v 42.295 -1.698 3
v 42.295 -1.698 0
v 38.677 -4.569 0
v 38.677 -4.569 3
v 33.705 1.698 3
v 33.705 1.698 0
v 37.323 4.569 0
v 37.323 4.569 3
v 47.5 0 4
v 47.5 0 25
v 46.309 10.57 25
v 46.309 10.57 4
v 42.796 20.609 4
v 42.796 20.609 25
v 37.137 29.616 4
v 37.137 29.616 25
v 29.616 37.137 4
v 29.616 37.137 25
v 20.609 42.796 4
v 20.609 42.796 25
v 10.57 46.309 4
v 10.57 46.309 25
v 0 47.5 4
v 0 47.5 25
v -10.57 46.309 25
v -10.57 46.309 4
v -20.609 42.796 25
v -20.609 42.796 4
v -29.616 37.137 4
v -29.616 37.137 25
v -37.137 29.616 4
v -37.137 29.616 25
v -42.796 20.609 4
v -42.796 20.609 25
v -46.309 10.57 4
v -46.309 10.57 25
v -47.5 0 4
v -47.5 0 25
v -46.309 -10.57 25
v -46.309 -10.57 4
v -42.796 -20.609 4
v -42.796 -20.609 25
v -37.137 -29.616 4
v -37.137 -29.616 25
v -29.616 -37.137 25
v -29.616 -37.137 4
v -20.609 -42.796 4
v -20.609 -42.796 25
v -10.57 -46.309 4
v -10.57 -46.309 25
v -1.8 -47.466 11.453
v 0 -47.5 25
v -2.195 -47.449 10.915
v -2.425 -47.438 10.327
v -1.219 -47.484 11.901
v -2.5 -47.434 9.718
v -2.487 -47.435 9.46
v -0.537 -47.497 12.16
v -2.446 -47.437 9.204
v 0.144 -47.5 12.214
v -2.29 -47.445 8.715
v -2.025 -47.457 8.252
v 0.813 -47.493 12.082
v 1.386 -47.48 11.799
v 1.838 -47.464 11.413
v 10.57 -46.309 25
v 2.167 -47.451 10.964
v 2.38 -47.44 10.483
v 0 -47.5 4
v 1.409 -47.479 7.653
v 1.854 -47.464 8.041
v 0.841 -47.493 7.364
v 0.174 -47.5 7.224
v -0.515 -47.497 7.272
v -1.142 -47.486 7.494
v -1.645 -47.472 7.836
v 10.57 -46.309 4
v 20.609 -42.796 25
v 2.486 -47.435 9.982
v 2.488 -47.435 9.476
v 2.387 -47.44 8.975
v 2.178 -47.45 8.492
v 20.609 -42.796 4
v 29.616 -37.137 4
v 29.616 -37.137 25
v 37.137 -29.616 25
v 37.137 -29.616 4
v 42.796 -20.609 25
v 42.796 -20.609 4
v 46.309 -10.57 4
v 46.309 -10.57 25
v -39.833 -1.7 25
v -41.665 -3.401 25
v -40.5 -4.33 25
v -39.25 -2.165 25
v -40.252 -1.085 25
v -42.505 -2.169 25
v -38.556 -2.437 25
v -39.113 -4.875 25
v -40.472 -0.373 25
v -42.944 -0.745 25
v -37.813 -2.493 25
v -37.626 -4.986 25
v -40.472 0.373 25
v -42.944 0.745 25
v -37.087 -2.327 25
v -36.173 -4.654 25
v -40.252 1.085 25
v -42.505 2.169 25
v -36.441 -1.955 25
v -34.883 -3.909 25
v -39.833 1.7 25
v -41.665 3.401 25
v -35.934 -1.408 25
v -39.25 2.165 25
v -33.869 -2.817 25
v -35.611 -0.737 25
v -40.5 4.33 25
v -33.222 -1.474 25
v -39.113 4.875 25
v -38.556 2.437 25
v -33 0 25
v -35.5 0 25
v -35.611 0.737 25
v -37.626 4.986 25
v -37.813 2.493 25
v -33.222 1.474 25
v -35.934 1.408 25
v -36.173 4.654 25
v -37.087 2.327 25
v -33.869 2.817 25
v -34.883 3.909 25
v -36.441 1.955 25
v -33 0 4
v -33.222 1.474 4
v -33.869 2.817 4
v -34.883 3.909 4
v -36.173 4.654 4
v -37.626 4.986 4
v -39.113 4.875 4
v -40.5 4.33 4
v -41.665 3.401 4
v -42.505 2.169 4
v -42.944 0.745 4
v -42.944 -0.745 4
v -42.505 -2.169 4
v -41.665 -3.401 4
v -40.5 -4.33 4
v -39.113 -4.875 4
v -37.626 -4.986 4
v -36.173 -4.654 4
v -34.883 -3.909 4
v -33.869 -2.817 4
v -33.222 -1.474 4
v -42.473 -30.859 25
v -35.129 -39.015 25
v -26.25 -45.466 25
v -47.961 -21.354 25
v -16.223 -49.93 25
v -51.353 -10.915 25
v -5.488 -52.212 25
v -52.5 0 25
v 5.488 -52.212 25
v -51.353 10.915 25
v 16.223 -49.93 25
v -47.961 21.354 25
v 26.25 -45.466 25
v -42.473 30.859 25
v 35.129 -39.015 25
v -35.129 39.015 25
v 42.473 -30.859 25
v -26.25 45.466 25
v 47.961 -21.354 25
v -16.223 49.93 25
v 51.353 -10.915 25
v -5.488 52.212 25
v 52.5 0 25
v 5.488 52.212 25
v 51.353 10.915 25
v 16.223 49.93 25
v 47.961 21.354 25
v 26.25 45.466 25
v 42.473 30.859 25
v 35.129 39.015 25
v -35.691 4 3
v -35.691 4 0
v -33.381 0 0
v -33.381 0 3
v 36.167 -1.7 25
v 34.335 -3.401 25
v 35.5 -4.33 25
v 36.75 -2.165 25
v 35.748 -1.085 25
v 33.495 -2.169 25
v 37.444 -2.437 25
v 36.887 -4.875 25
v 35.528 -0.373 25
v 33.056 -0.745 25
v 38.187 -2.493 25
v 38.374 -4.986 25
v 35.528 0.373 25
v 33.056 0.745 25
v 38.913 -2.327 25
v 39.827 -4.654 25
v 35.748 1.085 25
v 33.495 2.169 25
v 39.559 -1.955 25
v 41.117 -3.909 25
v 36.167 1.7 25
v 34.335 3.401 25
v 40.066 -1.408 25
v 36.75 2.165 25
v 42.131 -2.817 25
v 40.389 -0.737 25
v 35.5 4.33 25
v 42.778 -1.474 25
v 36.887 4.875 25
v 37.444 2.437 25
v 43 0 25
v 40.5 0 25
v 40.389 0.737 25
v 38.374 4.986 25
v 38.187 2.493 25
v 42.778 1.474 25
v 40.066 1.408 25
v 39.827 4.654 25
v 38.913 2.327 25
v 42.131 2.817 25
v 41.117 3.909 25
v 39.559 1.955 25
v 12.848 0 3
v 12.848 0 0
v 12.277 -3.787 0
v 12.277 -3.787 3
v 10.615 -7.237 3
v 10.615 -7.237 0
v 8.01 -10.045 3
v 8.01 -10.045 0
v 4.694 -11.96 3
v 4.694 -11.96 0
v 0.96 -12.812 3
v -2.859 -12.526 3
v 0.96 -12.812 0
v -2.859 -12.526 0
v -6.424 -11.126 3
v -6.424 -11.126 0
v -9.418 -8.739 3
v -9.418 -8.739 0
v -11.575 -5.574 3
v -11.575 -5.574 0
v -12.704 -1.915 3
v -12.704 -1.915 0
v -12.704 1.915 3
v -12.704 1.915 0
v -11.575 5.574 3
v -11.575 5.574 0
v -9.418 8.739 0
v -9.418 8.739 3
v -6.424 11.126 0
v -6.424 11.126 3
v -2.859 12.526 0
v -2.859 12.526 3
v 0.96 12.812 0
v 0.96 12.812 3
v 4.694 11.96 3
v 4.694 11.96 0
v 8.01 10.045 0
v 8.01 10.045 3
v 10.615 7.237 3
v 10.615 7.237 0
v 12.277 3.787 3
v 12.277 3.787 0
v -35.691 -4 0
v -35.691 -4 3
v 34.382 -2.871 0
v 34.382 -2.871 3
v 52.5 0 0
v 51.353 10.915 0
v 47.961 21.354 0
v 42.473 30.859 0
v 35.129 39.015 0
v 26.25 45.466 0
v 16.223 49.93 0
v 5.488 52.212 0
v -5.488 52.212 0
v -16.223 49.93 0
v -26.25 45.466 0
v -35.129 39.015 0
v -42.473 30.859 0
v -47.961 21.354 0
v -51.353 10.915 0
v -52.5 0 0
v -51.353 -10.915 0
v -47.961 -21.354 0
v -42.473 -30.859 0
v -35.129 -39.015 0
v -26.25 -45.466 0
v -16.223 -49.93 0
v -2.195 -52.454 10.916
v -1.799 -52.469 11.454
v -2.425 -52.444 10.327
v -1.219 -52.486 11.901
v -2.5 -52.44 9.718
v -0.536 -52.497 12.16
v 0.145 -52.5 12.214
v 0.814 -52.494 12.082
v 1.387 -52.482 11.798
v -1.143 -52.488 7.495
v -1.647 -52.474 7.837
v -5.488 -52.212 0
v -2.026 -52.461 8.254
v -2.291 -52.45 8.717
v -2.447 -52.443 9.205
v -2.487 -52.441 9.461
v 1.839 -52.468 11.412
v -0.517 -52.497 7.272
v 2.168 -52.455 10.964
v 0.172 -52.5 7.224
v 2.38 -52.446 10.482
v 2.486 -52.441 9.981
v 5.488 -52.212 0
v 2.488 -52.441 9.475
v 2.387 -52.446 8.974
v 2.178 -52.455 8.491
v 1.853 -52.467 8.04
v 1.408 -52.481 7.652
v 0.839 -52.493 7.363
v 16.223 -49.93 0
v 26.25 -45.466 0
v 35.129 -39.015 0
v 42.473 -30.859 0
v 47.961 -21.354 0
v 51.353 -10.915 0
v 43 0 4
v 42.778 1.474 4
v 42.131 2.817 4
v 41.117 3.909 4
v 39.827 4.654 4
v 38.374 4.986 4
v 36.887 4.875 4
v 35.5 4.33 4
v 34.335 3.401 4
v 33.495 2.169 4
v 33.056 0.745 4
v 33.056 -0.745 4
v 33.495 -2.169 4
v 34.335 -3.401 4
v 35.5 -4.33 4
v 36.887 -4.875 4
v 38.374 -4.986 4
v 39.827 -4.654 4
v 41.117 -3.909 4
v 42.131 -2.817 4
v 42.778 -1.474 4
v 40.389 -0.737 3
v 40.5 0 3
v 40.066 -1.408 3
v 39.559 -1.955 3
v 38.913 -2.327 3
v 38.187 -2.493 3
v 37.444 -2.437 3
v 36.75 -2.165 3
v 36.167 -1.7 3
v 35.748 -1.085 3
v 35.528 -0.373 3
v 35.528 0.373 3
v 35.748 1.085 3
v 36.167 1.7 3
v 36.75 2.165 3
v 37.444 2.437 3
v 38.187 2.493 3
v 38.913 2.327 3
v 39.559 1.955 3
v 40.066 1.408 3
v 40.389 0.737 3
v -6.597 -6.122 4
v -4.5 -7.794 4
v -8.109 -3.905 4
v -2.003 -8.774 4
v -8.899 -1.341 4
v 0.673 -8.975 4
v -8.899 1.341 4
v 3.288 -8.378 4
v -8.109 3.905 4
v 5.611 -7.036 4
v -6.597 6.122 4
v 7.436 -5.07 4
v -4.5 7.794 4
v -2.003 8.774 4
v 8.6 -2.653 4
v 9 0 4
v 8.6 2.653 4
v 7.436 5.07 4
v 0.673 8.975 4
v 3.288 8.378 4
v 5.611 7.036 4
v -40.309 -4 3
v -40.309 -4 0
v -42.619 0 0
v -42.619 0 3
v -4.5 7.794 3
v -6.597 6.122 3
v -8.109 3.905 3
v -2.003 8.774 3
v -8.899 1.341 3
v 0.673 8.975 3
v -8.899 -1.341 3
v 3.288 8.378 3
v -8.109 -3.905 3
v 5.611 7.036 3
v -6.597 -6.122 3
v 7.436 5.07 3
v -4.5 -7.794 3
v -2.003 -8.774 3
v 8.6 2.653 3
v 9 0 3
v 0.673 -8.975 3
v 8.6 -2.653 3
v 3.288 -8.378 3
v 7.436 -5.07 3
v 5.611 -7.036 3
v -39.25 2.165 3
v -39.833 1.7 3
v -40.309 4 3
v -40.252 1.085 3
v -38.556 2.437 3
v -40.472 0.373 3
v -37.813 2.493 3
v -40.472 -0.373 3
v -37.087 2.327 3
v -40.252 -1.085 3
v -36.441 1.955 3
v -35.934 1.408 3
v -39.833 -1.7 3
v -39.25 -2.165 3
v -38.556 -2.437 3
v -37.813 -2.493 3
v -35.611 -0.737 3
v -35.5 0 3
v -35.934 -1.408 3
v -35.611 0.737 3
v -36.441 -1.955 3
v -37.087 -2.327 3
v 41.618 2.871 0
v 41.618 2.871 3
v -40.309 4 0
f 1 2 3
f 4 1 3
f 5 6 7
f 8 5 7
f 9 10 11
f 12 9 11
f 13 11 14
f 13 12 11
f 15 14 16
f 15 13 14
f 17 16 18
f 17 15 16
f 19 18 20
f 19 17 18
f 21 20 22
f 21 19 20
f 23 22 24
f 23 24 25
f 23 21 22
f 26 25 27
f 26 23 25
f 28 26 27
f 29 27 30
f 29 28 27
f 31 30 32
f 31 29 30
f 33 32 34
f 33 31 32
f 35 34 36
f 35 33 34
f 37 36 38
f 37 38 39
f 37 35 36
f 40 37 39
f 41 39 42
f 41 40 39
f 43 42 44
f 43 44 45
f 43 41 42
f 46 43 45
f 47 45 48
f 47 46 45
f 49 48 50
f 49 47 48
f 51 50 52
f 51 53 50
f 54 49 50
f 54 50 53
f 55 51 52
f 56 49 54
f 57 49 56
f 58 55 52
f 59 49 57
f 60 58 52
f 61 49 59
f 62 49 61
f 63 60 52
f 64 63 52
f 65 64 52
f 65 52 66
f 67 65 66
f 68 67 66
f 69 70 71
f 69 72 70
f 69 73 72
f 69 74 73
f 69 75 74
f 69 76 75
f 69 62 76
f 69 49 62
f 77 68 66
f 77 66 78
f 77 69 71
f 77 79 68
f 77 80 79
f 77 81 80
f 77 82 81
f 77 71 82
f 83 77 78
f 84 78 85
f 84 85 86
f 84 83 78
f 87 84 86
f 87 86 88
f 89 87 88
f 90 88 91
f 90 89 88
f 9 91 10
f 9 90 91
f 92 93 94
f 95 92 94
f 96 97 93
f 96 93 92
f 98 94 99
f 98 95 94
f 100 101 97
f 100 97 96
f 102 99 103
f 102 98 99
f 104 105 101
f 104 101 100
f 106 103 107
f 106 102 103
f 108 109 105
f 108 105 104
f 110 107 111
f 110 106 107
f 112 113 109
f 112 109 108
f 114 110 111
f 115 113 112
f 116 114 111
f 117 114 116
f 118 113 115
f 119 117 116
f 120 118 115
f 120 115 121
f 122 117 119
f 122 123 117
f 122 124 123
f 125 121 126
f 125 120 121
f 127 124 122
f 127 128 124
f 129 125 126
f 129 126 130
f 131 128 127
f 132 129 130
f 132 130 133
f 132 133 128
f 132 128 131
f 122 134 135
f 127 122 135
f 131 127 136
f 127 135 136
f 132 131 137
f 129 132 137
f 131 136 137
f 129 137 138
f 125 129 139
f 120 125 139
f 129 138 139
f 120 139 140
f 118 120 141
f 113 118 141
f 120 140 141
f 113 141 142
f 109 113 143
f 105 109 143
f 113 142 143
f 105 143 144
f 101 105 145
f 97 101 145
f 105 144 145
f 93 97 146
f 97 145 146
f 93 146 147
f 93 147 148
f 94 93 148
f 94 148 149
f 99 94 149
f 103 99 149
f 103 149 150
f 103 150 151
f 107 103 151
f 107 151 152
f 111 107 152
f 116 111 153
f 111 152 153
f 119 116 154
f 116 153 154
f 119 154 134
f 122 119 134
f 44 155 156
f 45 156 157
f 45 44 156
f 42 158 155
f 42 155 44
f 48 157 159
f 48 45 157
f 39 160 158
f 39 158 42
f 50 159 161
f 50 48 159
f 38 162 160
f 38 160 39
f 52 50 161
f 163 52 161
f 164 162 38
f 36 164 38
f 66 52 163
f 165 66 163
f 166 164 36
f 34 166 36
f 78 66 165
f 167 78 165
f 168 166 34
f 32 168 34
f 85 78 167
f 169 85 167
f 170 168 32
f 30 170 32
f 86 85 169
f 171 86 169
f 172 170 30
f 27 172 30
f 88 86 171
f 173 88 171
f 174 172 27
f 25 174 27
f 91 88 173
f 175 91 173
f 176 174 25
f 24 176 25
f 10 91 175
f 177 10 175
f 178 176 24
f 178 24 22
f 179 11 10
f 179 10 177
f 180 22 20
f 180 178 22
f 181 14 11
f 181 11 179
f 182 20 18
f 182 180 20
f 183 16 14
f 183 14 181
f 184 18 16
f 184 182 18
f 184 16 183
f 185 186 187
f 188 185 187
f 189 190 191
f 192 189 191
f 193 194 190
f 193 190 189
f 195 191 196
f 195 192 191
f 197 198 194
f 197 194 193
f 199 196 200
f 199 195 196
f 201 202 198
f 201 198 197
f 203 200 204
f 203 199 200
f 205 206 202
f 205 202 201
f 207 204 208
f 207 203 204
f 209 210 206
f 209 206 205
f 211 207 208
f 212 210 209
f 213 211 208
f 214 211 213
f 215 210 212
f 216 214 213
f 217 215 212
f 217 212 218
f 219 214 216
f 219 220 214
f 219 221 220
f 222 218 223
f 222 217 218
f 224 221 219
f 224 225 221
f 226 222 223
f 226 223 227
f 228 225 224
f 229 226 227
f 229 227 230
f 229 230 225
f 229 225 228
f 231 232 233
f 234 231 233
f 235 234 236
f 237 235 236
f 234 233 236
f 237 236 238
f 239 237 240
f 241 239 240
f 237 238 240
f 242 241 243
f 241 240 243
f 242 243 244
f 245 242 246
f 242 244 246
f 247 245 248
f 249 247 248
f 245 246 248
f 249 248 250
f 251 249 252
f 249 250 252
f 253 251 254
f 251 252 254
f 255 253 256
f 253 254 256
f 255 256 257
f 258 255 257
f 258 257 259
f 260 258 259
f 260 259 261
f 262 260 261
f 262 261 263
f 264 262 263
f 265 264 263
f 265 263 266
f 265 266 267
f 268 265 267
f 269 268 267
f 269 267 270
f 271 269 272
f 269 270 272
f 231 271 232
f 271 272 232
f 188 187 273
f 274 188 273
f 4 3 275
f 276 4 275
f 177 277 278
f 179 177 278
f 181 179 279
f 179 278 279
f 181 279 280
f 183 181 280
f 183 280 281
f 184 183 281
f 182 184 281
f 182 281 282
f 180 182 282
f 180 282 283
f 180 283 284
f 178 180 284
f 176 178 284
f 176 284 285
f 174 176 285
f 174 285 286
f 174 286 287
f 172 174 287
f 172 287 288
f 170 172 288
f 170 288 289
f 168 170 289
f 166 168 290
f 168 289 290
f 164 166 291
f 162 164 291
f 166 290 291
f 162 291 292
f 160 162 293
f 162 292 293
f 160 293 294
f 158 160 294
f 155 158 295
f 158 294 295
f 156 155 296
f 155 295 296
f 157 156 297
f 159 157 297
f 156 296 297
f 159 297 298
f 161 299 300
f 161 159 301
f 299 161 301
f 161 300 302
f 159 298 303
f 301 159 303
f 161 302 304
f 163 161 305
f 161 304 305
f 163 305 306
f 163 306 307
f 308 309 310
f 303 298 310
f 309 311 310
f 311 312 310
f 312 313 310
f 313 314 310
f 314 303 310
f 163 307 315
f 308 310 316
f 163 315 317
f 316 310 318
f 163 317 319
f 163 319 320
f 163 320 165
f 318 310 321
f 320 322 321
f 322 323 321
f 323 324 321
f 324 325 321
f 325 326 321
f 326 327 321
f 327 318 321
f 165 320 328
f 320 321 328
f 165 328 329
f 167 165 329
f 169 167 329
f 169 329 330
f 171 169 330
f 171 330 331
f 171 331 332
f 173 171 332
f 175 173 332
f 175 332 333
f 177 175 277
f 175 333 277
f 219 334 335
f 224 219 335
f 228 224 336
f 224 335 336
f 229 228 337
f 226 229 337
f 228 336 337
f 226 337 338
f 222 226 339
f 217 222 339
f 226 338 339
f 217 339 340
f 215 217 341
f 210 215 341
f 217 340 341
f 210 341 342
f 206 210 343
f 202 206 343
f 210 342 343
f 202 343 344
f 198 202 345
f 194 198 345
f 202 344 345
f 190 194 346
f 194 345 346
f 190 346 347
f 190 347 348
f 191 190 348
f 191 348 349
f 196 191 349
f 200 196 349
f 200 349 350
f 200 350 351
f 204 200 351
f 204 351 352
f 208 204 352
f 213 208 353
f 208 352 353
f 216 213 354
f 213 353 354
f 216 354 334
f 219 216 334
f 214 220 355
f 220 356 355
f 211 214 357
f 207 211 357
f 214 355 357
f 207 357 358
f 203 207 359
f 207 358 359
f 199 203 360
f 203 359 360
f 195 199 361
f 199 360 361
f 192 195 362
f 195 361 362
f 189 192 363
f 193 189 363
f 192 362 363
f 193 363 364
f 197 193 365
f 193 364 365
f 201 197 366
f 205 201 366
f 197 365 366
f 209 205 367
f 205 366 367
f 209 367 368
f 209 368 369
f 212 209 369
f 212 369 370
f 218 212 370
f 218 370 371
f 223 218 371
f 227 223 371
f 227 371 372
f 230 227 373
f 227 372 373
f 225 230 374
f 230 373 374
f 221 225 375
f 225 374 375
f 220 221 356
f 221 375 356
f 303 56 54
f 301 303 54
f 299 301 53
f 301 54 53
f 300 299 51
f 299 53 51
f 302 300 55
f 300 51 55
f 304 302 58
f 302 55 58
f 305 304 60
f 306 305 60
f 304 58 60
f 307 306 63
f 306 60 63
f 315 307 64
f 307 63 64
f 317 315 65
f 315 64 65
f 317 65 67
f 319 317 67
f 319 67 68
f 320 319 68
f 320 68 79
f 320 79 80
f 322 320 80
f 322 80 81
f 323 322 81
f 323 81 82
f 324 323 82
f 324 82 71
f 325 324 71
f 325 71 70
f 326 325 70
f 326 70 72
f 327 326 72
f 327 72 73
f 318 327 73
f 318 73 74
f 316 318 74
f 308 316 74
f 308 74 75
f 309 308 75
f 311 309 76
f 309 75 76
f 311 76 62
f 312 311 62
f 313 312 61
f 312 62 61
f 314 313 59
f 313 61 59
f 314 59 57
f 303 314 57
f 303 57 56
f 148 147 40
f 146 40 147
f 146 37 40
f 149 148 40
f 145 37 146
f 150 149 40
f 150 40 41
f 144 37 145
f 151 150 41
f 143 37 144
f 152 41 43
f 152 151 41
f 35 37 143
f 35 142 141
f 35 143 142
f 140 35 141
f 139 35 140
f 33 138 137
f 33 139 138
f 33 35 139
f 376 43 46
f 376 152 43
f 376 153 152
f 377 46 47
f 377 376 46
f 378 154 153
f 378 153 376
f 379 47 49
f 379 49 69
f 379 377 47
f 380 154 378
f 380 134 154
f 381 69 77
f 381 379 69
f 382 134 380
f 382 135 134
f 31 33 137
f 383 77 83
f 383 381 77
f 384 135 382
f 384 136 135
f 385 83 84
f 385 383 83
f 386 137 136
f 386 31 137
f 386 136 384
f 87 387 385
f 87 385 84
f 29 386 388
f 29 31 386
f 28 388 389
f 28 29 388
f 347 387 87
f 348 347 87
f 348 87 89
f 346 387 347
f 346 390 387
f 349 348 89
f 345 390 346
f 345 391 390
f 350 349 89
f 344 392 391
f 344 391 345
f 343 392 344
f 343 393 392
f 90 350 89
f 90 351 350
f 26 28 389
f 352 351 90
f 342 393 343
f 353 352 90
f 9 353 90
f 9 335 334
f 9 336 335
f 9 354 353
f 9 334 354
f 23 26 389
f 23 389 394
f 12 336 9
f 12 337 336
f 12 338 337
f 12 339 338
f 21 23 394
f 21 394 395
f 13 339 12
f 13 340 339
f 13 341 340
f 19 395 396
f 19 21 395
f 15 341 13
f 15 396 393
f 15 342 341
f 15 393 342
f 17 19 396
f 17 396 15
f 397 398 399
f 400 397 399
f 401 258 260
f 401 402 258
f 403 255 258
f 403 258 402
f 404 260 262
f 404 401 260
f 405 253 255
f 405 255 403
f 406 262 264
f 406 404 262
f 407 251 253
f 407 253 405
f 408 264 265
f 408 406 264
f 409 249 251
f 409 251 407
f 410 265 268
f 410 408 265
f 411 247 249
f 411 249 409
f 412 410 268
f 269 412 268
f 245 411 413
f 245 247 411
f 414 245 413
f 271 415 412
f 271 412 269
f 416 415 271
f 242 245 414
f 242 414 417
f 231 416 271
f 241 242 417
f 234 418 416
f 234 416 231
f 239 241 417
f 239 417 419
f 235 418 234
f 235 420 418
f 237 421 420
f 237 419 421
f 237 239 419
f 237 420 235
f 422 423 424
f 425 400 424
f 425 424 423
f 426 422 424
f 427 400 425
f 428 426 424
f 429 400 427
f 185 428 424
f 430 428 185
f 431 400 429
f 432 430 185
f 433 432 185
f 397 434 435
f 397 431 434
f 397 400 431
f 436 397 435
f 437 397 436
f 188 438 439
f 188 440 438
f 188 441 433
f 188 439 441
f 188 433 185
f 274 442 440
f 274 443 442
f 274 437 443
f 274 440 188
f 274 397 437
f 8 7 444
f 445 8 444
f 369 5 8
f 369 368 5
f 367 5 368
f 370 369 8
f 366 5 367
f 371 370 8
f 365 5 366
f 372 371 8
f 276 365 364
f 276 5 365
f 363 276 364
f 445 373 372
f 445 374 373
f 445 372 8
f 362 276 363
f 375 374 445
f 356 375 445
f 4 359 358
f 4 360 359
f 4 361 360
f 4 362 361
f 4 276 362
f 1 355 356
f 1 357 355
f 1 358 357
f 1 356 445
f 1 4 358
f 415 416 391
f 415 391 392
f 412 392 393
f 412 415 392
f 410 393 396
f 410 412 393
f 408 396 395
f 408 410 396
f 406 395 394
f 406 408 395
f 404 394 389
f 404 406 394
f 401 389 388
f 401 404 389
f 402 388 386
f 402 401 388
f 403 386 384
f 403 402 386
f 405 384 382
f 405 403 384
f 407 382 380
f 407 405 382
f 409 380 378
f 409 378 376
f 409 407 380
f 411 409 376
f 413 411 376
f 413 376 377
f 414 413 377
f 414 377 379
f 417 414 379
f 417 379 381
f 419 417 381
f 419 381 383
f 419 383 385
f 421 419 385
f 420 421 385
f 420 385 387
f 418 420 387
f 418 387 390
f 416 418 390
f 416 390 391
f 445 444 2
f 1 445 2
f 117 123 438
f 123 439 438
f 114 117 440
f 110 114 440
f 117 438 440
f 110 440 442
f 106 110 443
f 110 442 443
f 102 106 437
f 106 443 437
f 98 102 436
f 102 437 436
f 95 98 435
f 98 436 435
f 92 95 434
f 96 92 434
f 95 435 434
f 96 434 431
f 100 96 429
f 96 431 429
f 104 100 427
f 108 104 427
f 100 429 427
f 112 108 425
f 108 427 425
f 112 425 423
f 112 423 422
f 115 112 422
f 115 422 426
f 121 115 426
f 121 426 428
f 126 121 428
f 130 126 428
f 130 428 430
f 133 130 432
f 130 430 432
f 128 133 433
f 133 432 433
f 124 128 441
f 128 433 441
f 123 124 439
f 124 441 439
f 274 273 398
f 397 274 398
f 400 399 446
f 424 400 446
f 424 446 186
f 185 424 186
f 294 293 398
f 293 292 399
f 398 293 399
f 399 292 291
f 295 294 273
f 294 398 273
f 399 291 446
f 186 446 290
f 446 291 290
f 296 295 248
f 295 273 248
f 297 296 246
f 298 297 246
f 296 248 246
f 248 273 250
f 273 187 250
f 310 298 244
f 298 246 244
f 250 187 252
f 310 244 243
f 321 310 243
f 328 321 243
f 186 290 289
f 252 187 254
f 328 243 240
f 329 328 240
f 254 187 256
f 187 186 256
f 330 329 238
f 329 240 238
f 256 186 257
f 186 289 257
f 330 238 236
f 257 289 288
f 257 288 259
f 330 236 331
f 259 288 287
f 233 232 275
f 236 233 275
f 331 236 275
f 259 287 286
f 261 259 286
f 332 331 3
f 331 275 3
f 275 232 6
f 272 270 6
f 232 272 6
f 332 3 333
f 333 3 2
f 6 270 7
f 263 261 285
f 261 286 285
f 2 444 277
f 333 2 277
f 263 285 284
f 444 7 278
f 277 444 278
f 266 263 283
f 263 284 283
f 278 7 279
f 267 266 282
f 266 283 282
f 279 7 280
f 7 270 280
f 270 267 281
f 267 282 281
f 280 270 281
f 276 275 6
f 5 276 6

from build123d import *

# Parameters (mm, degrees)
F0_R      = 47.5
F0_R_2    = 2.5
F0_R_3    = 9
F1_DEPTH  = 4
F0_R_4    = 52.5
F2_DEPTH  = 22
F3_DEPTH  = 25
F5_R      = 12.8477395495
F6_DEPTH  = 3
F8_DEPTH  = 3
F9_R      = 5
F9_R_2    = 2.5
F10_DEPTH = 21
F4_R      = 2.5
F11_DEPTH = 30
F14_D     = 5
F14_DEPTH = 10
F14_START = 0.2595577
F14_TIP   = 1.5021515476


with BuildPart() as f1:
    # F0 (on Top) → F1 (new body)
    with BuildSketch(Plane.XY):
        Circle(F0_R)
        with Locations((-38, 0)):
            Circle(F0_R_2, mode=Mode.SUBTRACT)
        Circle(F0_R_3, mode=Mode.SUBTRACT)
        with Locations((38, 0)):
            Circle(F0_R_2, mode=Mode.SUBTRACT)
    extrude(amount=F1_DEPTH)

    # F0 (on Top) → F2 (join)
    with BuildSketch(Plane.XY):
        Circle(F0_R_4)
        Circle(F0_R, mode=Mode.SUBTRACT)
    extrude(amount=F2_DEPTH)

    # F0 (on Top) → F3 (join)
    with BuildSketch(Plane.XY):
        Circle(F0_R_4)
        Circle(F0_R, mode=Mode.SUBTRACT)
    extrude(amount=F3_DEPTH)

    # F5 (on face) → F6 (cut)
    with BuildSketch(Plane(origin=(0, 0, 0), x_dir=(1, 0, 0), z_dir=(0, 0, -1))):
        Circle(F5_R)
    extrude(amount=-F6_DEPTH, mode=Mode.SUBTRACT)

    # F7 (on face) → F8 (cut)
    with BuildSketch(Plane(origin=(0, 0, 0), x_dir=(1, 0, 0), z_dir=(0, 0, -1))):
        Polygon((37.3229600728, -4.5689112784), (41.6182732711, -2.8707894156), (42.2953131984, 1.6981218628), (38.6770399272, 4.5689112784), (34.3817267289, 2.8707894156), (33.7046868016, -1.6981218628), align=None)
        Polygon((-40.3094010768, -4), (-35.6905989232, -4), (-33.3811978465, 0), (-35.6905989232, 4), (-40.3094010768, 4), (-42.6188021535, 0), align=None)
    extrude(amount=-F8_DEPTH, mode=Mode.SUBTRACT)

    # F9 (on face) → F10 (join)
    with BuildSketch(Plane.XY.offset(4)):
        with Locations((38, 0)):
            Circle(F9_R)
        with Locations((38, 0)):
            Circle(F9_R_2, mode=Mode.SUBTRACT)
        with Locations((-38, 0)):
            Circle(F9_R)
        with Locations((-38, 0)):
            Circle(F9_R_2, mode=Mode.SUBTRACT)
        with Locations((38, 0)):
            Circle(F9_R_2)
        with Locations((-38, 0)):
            Circle(F9_R_2)
    extrude(amount=F10_DEPTH)

    # F4 (on face) → F11 (cut)
    with BuildSketch(Plane(origin=(0, 0, 0), x_dir=(1, 0, 0), z_dir=(0, 0, -1))):
        with Locations((-38, 0)):
            Circle(F4_R)
        with Locations((38, 0)):
            Circle(F4_R)
    extrude(amount=-F11_DEPTH, mode=Mode.SUBTRACT)

    # F14
    # its depths count from where the whole tool has entered the part; down to there all is cleared
    with Locations(Plane.XZ.offset(52.7).offset(-F14_START)):
        with Locations((0, 9.7180558369)):
            Hole(F14_D / 2, depth=F14_DEPTH)
            with Locations((0, 0, -(F14_DEPTH + F14_TIP / 2))):  # 118° drill point
                Cone(0, F14_D / 2, F14_TIP, mode=Mode.SUBTRACT)


solid = f1.part
